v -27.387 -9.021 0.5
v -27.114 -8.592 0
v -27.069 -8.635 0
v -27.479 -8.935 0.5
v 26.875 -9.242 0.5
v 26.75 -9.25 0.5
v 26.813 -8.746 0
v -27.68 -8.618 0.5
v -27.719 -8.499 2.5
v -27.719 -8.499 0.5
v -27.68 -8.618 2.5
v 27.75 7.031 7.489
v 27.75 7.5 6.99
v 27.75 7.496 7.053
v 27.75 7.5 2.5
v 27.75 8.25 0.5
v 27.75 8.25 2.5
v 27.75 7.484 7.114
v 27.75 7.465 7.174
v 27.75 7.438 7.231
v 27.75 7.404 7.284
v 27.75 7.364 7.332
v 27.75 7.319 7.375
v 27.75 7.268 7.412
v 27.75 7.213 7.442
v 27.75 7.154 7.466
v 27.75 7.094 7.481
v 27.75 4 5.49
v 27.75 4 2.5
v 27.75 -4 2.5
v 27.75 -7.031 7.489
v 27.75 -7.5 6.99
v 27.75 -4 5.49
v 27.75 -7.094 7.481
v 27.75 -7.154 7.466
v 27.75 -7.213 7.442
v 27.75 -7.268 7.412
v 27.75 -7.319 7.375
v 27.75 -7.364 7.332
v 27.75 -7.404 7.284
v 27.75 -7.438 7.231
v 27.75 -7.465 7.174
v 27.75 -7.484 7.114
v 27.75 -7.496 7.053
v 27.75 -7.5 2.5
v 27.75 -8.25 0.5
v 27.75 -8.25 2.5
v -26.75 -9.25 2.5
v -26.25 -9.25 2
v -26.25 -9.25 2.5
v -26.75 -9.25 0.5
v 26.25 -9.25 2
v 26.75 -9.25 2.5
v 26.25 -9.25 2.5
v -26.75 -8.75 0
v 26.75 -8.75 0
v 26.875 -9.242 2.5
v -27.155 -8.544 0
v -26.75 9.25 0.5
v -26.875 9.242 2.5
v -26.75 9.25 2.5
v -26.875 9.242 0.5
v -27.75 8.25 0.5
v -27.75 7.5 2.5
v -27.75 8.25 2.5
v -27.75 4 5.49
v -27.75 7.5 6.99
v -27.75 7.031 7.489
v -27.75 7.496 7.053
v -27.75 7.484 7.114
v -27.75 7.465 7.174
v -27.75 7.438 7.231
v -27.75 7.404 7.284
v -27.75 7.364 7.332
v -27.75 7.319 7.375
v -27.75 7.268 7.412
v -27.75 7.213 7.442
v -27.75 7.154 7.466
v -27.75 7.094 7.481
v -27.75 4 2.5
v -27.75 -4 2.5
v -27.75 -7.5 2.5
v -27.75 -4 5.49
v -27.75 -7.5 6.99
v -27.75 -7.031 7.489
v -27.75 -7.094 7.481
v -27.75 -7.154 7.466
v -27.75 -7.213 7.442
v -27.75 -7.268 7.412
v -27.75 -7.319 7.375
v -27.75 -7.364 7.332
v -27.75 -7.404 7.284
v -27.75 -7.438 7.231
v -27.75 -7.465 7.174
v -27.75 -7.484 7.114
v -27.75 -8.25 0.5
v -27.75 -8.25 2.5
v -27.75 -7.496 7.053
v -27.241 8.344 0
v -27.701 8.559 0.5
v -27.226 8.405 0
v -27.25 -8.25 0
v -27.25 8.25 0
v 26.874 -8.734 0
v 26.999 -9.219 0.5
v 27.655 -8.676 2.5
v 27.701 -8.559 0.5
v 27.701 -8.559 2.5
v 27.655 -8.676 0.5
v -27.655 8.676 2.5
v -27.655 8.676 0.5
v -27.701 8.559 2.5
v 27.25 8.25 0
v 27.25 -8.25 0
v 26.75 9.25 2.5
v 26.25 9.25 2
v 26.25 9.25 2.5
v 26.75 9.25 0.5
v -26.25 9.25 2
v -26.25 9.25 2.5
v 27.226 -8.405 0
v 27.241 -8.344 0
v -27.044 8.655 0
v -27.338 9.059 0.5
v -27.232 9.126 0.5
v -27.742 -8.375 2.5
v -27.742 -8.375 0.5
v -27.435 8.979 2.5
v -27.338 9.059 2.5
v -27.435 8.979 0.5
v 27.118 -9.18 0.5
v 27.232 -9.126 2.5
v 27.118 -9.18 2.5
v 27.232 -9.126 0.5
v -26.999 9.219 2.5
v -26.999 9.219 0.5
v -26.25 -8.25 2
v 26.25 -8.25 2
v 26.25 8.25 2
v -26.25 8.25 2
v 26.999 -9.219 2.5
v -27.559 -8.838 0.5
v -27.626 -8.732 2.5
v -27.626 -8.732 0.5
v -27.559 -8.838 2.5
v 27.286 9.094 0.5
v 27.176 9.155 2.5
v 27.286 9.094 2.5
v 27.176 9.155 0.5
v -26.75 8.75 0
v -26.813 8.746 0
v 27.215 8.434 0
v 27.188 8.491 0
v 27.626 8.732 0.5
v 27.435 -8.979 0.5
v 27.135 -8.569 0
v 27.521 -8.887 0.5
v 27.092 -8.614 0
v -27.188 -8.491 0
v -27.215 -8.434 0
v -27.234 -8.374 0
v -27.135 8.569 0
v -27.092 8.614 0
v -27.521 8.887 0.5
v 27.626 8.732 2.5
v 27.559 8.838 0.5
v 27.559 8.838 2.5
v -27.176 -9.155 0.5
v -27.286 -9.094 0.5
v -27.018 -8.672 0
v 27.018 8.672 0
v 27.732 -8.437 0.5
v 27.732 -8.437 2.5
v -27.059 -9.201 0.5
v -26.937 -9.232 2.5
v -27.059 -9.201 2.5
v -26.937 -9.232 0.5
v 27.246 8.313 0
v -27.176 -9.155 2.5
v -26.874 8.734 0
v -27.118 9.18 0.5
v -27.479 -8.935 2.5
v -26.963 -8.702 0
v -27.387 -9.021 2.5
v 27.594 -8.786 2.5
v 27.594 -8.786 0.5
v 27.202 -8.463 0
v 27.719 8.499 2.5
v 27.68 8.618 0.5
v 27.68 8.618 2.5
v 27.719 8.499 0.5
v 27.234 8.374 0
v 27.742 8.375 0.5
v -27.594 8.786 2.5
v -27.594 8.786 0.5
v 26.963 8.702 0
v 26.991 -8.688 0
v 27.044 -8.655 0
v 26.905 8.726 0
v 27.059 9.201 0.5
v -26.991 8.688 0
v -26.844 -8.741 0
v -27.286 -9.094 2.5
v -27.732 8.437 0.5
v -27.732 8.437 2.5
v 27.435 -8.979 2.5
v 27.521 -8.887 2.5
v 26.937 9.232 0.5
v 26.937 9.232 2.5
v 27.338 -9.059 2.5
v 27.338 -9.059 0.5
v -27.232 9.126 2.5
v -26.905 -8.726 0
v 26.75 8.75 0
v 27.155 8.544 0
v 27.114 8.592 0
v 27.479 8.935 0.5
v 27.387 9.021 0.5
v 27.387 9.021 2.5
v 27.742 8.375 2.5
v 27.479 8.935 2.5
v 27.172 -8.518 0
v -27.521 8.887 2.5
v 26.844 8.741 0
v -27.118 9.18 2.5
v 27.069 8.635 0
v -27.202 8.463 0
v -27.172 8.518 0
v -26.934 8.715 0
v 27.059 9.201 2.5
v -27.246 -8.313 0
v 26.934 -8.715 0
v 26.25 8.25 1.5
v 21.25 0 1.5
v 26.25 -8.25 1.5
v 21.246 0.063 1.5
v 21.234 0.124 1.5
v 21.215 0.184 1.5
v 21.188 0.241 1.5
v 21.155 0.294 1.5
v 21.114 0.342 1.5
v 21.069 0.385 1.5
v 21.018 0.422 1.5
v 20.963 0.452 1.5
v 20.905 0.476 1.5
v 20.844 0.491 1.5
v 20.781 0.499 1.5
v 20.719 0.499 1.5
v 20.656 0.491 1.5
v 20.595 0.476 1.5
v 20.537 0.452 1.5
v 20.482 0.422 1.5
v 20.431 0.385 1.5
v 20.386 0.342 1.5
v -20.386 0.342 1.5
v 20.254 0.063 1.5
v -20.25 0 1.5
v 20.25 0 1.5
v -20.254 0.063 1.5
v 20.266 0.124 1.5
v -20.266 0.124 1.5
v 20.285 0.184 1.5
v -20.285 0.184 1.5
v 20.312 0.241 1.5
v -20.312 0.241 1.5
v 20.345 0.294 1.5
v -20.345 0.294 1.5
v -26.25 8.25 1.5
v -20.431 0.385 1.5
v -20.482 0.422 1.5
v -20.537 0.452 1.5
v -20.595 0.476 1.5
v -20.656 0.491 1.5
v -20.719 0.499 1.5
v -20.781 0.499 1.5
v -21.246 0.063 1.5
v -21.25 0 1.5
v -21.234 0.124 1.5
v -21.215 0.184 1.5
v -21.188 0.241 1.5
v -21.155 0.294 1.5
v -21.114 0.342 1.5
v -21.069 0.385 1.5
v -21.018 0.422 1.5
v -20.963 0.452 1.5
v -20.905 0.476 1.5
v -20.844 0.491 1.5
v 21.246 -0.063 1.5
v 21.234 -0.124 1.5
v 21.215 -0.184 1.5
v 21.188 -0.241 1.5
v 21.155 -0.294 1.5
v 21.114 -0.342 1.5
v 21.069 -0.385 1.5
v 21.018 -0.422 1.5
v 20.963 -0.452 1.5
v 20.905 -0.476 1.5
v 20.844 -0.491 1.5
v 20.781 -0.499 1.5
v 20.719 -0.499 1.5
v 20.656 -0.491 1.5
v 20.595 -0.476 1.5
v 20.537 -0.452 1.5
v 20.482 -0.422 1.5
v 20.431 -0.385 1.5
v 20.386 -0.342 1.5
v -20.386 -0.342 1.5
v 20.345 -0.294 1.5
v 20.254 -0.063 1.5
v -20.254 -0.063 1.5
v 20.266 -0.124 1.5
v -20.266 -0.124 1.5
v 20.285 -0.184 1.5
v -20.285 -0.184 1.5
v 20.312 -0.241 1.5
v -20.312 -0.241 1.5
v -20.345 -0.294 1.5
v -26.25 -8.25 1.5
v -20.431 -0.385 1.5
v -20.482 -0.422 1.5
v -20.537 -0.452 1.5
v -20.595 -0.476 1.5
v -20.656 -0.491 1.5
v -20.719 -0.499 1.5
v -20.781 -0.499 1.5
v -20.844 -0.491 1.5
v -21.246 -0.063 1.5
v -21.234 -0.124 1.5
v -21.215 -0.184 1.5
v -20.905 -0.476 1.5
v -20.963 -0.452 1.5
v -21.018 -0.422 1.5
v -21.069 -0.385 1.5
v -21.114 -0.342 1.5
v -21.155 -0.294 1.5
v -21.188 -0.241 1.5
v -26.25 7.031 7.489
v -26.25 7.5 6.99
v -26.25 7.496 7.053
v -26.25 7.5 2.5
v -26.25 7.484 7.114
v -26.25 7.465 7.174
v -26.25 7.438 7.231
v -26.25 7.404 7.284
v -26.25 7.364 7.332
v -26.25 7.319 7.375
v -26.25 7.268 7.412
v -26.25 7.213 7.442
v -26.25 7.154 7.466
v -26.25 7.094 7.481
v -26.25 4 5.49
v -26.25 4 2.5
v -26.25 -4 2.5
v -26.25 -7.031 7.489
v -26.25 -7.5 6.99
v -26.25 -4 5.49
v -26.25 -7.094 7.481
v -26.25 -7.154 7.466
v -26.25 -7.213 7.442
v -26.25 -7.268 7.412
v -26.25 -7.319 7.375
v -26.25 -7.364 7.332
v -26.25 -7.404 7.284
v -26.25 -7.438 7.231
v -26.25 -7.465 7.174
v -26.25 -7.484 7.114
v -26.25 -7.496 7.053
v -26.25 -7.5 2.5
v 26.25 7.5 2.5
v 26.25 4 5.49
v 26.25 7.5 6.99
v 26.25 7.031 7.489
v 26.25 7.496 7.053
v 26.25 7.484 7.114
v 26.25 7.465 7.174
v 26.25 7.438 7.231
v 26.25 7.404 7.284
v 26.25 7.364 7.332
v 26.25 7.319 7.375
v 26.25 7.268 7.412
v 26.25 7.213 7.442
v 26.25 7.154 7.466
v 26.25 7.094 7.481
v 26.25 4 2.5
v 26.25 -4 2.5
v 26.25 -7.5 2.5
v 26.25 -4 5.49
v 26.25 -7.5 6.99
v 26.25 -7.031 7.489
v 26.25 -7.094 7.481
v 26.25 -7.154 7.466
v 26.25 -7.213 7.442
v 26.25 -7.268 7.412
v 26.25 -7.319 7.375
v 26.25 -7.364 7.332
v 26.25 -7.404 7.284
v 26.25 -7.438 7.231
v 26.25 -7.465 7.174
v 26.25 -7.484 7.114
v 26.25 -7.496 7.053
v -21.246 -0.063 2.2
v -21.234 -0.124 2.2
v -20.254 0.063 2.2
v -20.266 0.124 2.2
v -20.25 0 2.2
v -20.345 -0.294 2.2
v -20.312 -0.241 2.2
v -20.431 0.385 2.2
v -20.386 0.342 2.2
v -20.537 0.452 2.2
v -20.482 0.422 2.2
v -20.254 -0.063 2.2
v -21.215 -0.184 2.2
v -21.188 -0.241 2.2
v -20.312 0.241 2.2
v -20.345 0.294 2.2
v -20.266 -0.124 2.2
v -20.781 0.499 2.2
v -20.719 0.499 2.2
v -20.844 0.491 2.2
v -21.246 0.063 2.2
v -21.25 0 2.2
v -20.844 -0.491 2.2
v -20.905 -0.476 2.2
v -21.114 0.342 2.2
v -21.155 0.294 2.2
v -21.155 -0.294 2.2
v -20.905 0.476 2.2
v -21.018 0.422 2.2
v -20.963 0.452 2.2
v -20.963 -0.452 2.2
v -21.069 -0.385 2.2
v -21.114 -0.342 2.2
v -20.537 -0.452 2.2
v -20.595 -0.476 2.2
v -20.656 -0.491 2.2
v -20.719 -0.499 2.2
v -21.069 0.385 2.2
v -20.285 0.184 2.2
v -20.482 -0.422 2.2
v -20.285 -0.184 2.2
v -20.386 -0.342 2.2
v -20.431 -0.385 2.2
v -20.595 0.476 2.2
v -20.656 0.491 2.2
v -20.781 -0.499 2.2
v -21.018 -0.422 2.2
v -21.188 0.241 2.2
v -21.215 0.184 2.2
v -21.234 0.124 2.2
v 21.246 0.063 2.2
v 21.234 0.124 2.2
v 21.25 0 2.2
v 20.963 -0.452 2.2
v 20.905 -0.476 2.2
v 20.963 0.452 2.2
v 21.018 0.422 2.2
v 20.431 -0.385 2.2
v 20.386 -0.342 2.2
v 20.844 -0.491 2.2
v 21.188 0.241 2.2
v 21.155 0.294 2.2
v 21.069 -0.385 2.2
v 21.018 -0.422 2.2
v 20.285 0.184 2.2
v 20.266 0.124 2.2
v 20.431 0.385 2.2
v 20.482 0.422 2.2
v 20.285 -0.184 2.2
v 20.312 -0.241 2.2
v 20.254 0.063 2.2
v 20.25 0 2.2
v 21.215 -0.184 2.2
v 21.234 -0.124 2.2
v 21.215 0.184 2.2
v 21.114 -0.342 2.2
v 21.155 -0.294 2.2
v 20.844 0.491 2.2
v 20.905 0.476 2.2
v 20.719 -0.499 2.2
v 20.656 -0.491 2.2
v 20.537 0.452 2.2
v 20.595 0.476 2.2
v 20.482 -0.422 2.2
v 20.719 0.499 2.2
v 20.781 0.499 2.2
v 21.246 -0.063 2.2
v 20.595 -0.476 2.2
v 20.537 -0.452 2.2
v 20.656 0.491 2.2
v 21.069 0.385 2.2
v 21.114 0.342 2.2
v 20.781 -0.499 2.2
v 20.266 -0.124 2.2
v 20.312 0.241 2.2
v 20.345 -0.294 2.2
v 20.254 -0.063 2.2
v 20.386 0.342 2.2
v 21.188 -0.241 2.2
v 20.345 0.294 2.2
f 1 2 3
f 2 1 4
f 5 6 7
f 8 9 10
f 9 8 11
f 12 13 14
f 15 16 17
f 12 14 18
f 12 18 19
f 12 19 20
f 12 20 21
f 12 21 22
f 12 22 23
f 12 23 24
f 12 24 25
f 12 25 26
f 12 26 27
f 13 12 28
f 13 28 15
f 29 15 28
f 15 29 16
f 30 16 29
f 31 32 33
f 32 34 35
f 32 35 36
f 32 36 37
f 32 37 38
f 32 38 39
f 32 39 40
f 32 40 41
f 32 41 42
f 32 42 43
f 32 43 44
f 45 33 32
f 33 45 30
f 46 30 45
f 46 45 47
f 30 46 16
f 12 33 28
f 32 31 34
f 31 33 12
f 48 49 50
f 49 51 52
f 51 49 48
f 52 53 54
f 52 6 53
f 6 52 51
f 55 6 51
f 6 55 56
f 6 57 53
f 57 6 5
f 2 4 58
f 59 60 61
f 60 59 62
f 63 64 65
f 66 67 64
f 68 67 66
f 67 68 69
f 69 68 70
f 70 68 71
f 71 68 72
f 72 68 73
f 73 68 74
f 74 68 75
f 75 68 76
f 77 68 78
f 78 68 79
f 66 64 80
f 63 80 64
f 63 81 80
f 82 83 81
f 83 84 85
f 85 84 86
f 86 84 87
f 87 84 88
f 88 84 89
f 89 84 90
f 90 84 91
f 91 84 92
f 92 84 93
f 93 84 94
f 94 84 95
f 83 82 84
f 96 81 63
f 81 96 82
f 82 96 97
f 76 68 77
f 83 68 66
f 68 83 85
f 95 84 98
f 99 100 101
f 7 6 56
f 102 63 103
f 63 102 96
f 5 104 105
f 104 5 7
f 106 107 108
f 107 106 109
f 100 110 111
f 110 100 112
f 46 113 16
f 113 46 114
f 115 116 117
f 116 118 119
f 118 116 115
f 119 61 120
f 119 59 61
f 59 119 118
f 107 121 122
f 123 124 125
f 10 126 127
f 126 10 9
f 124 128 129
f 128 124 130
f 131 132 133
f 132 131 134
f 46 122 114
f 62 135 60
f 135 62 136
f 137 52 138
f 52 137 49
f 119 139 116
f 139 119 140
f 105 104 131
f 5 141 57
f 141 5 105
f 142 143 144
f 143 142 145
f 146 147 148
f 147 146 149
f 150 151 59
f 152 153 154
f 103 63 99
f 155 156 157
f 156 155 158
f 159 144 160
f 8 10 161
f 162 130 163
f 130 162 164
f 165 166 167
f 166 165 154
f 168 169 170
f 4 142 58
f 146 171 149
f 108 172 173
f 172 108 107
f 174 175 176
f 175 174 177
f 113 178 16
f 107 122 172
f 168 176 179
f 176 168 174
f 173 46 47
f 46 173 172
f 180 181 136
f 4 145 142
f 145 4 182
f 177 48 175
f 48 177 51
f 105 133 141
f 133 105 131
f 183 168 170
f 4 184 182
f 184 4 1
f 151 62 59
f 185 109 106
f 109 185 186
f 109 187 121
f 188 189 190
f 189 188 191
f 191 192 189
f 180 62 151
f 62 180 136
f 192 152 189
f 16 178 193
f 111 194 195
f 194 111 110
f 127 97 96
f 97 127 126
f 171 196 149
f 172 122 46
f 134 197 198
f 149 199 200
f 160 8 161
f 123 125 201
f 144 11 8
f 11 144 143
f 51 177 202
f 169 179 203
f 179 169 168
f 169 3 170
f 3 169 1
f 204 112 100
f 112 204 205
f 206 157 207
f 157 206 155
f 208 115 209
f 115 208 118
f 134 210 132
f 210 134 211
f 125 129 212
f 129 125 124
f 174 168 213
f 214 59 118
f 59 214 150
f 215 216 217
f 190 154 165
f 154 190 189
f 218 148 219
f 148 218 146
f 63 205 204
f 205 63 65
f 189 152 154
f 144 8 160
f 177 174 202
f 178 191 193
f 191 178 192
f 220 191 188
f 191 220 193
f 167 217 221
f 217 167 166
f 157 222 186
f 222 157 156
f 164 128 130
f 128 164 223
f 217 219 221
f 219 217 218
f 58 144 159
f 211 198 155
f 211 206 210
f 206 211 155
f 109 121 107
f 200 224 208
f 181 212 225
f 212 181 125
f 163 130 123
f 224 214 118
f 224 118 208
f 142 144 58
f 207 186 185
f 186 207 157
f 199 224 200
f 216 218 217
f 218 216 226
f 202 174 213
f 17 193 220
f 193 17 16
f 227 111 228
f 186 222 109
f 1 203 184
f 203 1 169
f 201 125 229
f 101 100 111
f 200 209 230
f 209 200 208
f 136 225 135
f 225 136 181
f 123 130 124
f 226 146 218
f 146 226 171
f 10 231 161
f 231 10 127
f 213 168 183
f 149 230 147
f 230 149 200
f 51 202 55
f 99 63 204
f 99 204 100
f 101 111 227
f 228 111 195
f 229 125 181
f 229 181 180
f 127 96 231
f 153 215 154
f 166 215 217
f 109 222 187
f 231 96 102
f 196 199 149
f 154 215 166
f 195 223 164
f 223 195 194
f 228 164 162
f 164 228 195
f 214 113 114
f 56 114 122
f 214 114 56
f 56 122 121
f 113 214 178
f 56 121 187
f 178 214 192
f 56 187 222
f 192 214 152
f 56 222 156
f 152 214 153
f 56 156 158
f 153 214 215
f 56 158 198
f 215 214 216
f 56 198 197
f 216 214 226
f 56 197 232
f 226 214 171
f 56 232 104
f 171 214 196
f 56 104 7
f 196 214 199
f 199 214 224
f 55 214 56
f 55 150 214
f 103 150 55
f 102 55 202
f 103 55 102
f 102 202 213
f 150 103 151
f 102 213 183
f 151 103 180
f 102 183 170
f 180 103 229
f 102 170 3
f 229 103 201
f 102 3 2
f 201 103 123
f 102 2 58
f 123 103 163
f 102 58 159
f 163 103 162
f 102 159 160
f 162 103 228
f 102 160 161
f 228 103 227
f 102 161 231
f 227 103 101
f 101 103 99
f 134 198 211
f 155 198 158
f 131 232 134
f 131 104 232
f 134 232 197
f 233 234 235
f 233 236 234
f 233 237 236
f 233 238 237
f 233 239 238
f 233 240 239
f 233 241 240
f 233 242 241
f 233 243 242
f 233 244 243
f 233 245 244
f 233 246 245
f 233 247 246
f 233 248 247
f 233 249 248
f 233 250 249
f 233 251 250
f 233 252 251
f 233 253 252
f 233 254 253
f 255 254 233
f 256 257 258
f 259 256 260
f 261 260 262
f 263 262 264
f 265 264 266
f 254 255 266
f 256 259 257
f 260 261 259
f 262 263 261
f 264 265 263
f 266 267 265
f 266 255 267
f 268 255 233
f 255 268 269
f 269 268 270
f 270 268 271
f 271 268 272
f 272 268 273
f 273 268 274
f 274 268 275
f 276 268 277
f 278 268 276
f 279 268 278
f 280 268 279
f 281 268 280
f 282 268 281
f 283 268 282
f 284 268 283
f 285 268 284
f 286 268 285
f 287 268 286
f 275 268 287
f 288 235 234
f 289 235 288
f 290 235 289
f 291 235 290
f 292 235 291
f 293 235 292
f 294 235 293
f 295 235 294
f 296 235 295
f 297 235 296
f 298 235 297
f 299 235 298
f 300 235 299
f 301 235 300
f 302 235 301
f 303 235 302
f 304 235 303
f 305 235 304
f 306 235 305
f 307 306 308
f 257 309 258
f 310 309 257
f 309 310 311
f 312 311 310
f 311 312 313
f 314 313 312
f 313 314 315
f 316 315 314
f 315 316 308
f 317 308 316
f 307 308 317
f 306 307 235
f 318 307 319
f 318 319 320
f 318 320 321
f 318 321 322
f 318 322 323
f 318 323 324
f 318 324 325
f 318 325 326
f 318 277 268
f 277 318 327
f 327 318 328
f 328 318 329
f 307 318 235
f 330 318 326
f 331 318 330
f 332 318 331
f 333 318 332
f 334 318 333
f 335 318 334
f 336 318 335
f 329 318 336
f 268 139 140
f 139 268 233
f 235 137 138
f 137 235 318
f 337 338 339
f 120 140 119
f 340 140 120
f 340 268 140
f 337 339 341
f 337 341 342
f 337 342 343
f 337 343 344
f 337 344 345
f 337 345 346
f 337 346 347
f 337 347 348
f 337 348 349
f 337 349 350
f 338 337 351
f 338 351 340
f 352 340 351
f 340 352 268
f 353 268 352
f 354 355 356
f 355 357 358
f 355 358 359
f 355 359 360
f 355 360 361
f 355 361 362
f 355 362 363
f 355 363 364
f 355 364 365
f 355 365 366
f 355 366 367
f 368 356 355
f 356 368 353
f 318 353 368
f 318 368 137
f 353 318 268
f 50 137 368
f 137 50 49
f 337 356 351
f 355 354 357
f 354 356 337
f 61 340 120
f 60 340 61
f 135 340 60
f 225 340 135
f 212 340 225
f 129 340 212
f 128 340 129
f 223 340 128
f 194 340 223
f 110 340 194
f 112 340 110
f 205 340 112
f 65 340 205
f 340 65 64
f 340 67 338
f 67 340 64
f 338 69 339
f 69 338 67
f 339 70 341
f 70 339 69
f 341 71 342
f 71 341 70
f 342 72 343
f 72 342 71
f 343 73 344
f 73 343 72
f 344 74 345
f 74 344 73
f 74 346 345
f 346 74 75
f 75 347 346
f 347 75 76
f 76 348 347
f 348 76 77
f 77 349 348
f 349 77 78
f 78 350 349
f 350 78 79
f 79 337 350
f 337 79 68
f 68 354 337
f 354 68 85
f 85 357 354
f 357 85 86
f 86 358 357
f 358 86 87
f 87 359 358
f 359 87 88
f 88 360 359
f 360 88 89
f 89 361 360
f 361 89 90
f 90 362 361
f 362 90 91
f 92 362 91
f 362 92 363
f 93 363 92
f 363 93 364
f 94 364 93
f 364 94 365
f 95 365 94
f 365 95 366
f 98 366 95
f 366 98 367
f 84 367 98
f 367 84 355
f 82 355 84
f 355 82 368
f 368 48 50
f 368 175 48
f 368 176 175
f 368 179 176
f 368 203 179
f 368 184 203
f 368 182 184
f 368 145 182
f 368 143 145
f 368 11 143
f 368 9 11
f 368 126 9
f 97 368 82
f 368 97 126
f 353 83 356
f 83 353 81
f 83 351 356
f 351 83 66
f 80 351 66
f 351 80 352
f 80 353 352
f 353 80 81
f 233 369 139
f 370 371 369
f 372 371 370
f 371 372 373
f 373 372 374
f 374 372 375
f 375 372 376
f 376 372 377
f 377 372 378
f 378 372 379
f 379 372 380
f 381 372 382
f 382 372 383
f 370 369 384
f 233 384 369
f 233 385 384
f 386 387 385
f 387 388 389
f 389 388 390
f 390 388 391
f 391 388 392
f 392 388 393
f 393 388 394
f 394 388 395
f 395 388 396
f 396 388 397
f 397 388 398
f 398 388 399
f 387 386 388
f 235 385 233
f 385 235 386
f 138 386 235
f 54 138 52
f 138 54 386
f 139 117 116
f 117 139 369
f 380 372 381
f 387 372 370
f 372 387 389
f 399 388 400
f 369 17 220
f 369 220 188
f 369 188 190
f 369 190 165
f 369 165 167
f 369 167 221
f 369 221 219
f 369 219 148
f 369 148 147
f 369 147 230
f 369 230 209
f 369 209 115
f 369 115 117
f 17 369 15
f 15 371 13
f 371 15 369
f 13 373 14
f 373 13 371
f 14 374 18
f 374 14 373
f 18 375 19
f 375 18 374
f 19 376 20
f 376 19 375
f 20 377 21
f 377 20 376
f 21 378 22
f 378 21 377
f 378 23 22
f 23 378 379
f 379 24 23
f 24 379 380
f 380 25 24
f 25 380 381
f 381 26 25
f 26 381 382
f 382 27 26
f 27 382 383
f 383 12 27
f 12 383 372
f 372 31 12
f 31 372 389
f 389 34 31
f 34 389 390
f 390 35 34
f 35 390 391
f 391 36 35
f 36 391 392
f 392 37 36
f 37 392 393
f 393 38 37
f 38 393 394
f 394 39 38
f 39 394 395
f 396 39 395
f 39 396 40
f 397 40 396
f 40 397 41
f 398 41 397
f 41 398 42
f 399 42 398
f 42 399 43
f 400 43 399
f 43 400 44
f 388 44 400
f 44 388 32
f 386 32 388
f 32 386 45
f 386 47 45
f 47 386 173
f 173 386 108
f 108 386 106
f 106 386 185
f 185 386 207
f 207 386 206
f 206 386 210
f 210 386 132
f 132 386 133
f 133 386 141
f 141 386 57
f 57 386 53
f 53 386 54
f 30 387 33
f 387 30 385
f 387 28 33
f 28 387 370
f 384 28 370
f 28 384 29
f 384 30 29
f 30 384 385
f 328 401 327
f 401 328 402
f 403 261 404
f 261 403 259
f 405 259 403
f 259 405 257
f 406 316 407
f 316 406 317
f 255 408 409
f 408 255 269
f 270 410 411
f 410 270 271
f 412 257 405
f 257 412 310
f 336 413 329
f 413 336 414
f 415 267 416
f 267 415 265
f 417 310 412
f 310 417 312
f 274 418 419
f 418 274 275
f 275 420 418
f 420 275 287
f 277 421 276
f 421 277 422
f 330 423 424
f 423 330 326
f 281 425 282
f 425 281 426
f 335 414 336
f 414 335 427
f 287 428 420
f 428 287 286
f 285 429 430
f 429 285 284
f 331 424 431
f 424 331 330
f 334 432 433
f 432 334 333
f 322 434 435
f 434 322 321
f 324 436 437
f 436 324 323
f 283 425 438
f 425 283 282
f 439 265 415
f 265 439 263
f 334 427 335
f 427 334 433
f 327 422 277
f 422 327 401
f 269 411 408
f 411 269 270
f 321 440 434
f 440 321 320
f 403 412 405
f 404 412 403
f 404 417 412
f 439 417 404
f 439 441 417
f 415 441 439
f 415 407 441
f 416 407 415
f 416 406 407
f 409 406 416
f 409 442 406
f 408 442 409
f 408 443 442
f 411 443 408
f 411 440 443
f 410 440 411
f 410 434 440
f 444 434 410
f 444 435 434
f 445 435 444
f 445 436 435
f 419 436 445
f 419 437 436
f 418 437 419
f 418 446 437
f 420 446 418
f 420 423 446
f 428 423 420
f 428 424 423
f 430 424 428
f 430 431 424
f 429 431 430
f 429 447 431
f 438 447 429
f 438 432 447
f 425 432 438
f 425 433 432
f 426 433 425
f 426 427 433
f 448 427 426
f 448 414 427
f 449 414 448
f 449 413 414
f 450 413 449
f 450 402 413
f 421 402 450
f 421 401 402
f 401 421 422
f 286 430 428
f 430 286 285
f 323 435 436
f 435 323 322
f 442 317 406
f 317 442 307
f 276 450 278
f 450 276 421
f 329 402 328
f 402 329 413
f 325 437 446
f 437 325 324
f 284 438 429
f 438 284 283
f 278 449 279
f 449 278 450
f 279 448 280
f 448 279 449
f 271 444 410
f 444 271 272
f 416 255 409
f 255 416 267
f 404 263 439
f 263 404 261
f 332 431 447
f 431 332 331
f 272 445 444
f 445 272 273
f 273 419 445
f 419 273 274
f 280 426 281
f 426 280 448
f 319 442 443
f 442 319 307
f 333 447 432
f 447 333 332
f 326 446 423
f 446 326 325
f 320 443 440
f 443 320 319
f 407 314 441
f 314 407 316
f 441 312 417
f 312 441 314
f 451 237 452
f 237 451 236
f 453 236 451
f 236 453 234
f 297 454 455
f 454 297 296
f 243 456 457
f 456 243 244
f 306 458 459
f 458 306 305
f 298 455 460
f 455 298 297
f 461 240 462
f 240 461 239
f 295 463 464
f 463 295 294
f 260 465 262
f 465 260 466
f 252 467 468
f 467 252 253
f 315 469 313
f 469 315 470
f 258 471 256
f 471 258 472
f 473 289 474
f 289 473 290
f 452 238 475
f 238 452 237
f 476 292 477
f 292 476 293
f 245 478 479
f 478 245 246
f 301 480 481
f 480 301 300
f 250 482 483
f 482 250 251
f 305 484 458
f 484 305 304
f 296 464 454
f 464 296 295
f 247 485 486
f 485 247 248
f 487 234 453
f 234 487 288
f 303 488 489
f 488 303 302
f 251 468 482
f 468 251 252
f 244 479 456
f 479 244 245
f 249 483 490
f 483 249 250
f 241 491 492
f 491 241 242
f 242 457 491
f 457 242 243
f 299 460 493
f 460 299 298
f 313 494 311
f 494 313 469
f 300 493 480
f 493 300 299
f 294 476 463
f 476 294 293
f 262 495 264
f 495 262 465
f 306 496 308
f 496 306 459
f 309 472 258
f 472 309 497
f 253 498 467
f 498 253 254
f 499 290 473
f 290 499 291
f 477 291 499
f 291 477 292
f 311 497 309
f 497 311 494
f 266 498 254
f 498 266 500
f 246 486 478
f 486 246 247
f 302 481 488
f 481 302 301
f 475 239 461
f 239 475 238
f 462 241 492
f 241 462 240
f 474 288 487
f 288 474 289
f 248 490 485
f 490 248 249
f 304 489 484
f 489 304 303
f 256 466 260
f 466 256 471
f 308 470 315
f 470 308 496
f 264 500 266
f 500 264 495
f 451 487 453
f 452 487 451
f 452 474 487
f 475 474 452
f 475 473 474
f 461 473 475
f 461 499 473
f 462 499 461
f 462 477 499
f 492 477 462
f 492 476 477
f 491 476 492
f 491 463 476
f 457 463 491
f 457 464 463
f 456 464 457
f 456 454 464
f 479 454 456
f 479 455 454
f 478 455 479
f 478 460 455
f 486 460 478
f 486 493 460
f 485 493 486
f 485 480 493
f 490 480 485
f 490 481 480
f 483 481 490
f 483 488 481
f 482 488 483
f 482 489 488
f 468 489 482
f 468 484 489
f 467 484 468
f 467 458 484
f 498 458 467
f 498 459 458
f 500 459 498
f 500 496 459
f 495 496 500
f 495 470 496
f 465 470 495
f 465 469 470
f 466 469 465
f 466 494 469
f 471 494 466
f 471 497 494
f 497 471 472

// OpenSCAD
// Replacement/customizable cover tile for a Gira Pushbutton Sensor.
//
// A shallow tray with a raised lip and a retaining arch clip on each short end, plus two small pins
// inside the tray. Intended to fit the Gira Pushbutton Sensor 3 Komfort family, including the 3-gang
// KNX variant documented by Gira as item no. 5133 00.
//
// Product reference: https://katalog.gira.de/en-INT/datenblatt/4010337086857
//
// Print with the flat face on the bed (clips pointing up); no supports are needed.

// Smooth edge rounding
$fn = 50;

// Small epsilon to avoid SCAD Z-fighting (explained at https://en.wikipedia.org/wiki/Z-fighting)
eps = 0.01;

///////////////////////////////////////////////////////////////////////////////////////////////////
// Configuration Block

// Outer envelope of the tile:
// The flat face at z = 0 is the visible side.
length = 55.5; // mm
width = 18.5; // mm
thickness = 2; // mm

// Cosmetics of the visible face:
// Rounded plan-view corners and a 45-degree chamfer around the face edge for improved aesthetic.
// Also hides the elephant's foot of the first layer. Set either to 0 for a plain (square) box.
corner_radius = 1; // mm
face_chamfer = 0.5; // mm

// Shell:
// The tray cavity is whatever is left inside the perimeter wall above the floor.
wall_thickness = 1; // mm
floor_thickness = 1.5; // mm (the original tile is 1 mm; 1.5 mm is noticeably stiffer)

// Raised lip across each short end, on top of the rim, that the clip stands on.
lip_height = 0.5; // mm

// Retaining arch clip on each short end:
// Two legs and a top bar. Only the two outer top corners are rounded. The clip is flush with the
// outer end face and grows inward only; the lip under it and the end of the tray cavity are filled
// to the same thickness so the clip is fully supported down to the floor.
clip_thickness = 1.5; // mm (the original tile is 1 mm; 1.5 mm makes the legs stronger when printed using PLA and still fits the slot)
clip_width = 15; // mm
clip_height = 5; // mm
clip_bar_height = 2; // mm
clip_gap = 8; // mm, between the legs
clip_corner_radius = 0.5; // mm

// Small pins:
// Rising from the tray floor to slightly above the rim, centered across the width and inset from each end.
pin_inset = 7; // mm
pin_radius = 0.5; // mm
pin_protrusion = 0.2; // mm, above the rim

// Configuration Block
///////////////////////////////////////////////////////////////////////////////////////////////////

cavity_length = length - 2 * wall_thickness;
cavity_width = width - 2 * wall_thickness;
cavity_depth = thickness - floor_thickness;

// Plan-view outline of the tile, optionally inset from the outer edge (corners stay concentric).
module footprint_2d(inset = 0) {
  offset(r = corner_radius - inset)
    square([length - 2 * corner_radius, width - 2 * corner_radius], center = true);
}

// Solid plate with the face edge chamfered: the hull of the full footprint (from the chamfer height
// up) and the footprint inset by the chamfer at the face.
module plate() {
  hull() {
    linear_extrude(eps)
      footprint_2d(face_chamfer);

    translate([0, 0, face_chamfer])
      linear_extrude(thickness - face_chamfer)
        footprint_2d();
  }
}

// Plate with the tray cavity cut out of the top.
module tray() {
  difference() {
    plate();

    translate([0, 0, floor_thickness])
      linear_extrude(thickness)
        square([cavity_length, cavity_width], center = true);
  }
}

// 2D arch profile of one clip (y up from the lip); extruded into 3D by end_clip().
module clip_profile_2d() {
  difference() {
    // Rectangle with its two top corners rounded.
    hull() {
      translate([-clip_width / 2, 0])
        square([clip_width, clip_height - clip_corner_radius]);

      for (side = [-1, 1])
        translate([side * (clip_width / 2 - clip_corner_radius), clip_height - clip_corner_radius])
          circle(clip_corner_radius);
    }

    // Opening between the legs.
    translate([-clip_gap / 2, -1])
      square([clip_gap, clip_height - clip_bar_height + 1]);
  }
}

// Builds the raised lip and the arch clip on one short end of the tile. Pass x_side = -1 for the
// left end or 1 for the right end.
module end_clip(x_side) {
  base_height = cavity_depth + lip_height;

  intersection() {
    // Trims the full-width base to the rounded corners of the footprint.
    linear_extrude(thickness + lip_height + clip_height)
      footprint_2d();

    // Flush with the outer end face, extruded clip_thickness inward.
    translate([x_side * (length - clip_thickness) / 2, 0, floor_thickness])
      rotate([90, 0, 90])
        linear_extrude(clip_thickness, center = true) {
          // Base starts at the tray floor, so it is both the lip and the cavity fill under a clip
          // that is thicker than the wall.
          translate([-width / 2, 0])
            square([width, base_height]);

          translate([0, base_height - eps])
            clip_profile_2d();
        }
  }
}

module pin(x_side) {
  translate([x_side * (length / 2 - pin_inset), 0, floor_thickness])
    cylinder(h = cavity_depth + pin_protrusion, r = pin_radius);
}

tray();

for (x_side = [-1, 1]) {
  end_clip(x_side);
  pin(x_side);
}
